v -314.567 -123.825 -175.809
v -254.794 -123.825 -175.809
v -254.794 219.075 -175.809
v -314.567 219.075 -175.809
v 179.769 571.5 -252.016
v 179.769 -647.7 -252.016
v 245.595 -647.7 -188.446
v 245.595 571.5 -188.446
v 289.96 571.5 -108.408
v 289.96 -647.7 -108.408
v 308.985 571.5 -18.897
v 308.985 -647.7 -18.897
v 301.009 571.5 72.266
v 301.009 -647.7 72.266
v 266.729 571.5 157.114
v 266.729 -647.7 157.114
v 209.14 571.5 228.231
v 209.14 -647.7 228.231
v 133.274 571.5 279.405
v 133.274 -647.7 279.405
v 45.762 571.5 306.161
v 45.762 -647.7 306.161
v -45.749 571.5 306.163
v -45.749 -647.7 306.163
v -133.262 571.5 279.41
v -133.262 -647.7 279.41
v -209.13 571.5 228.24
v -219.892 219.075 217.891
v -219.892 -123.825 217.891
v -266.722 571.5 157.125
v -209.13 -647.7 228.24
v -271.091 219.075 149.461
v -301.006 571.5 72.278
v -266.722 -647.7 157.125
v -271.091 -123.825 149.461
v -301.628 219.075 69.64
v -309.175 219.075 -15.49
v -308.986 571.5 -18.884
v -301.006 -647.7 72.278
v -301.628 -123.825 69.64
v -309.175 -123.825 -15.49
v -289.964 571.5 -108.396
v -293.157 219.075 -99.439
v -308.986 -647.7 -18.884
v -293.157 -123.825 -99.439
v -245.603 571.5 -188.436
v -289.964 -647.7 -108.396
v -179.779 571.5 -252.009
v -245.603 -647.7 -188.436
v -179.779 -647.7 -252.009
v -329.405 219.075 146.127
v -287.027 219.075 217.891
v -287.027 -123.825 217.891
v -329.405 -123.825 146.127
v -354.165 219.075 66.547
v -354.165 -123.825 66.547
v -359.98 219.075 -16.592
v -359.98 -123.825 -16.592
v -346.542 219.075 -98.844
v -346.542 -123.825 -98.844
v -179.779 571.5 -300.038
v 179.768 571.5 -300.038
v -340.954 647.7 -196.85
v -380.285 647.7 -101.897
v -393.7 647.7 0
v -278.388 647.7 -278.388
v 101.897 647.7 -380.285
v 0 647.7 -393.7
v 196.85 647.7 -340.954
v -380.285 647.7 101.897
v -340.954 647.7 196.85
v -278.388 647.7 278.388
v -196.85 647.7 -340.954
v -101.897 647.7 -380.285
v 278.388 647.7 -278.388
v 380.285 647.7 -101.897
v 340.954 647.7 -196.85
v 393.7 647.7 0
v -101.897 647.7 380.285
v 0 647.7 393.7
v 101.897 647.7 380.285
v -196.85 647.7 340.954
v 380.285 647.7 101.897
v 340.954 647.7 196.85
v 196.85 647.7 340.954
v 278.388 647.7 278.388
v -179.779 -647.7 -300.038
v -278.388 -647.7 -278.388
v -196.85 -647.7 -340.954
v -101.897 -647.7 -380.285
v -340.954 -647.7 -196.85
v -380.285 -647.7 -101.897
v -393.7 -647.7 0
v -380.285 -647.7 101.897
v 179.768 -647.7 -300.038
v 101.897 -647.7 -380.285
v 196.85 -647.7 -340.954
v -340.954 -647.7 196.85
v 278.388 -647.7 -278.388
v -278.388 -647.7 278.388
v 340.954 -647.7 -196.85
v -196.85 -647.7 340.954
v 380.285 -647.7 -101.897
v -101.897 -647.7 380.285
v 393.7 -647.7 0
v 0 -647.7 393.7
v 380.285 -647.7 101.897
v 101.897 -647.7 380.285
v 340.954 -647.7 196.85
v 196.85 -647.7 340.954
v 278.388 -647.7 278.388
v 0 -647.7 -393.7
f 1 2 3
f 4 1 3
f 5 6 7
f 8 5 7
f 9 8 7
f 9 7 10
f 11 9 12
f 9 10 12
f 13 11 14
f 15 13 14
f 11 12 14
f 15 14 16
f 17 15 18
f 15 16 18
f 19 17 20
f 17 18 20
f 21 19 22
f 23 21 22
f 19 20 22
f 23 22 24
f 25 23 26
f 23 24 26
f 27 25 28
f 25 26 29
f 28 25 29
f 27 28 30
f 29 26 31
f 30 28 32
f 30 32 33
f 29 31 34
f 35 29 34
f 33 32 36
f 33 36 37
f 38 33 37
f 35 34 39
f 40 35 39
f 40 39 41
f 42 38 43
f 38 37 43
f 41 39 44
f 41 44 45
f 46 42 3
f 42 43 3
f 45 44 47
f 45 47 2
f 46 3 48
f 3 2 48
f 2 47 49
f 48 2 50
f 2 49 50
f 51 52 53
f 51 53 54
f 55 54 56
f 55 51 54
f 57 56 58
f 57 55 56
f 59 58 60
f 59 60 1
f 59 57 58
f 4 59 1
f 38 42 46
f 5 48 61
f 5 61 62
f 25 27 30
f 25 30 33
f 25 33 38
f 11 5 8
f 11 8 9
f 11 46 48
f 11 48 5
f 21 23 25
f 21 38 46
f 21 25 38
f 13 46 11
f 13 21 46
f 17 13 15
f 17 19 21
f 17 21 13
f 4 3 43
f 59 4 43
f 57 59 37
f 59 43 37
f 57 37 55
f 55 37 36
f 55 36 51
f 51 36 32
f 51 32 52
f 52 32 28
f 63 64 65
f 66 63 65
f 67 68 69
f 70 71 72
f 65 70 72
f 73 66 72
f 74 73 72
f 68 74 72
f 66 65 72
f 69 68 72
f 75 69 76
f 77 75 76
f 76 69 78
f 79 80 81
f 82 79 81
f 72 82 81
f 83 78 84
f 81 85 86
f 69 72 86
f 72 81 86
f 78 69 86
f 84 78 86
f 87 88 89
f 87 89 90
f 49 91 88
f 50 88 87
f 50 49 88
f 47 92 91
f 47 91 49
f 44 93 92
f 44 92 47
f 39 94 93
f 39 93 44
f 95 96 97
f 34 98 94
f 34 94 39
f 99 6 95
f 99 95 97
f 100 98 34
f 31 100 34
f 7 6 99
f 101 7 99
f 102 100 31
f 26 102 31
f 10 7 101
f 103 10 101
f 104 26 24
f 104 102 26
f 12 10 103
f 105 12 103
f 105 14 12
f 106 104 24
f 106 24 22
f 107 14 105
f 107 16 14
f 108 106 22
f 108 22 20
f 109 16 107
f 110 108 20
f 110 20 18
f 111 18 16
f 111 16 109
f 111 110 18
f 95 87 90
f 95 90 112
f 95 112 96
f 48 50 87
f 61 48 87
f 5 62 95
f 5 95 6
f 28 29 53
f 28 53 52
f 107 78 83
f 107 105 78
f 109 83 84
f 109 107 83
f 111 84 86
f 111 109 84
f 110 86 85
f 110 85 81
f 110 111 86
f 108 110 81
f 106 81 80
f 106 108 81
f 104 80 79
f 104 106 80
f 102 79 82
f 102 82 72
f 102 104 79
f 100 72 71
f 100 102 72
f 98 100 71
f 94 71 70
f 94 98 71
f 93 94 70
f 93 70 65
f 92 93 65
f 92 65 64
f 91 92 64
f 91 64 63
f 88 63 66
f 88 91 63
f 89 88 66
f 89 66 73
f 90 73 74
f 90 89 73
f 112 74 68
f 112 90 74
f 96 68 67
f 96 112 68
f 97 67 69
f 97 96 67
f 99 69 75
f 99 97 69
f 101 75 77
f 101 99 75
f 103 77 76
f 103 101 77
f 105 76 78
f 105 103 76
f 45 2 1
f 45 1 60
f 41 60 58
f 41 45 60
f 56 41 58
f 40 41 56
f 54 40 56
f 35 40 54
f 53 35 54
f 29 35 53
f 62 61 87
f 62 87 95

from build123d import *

# Parameters (mm, degrees)
F0_R     = 360.3625
F1_DEPTH = 647.7
F3_DEPTH = 1219.2
F5_W     = 342.9
F5_H     = 393.7
F6_DEPTH = 279.4
F7_R     = 393.7
F7_R_2   = 360.3625
F8_DEPTH = 647.7


# Not quite as in the source:
# - a feature names something its author has since deleted; it is built from what else it names


with BuildPart() as f1:
    # F0 (on Front) → F1 (new body, symmetric)
    with BuildSketch(Plane.XZ):
        Circle(F0_R)
    extrude(amount=F1_DEPTH, both=True)

    # F2 (on face) → F3 (cut)
    with BuildSketch(Plane.XZ.offset(647.7)):
        with BuildLine():
            ThreePointArc((-76.2, -300.0375), (-130.2228778271, -280.8397113954), (-179.7789835799, -252.0088460138))
            Line((-179.7789835799, -252.0088460138), (-179.7789835799, -300.0375))
            Line((-179.7789835799, -300.0375), (-76.2, -300.0375))
        make_face()
        with BuildLine():
            ThreePointArc((179.7685, -252.016324499), (275.2076740277, -141.7380596823), (309.5625, 0))
            ThreePointArc((309.5625, 0), (-141.7323354104, 275.2106220794), (-179.7789835799, -252.0088460138))
            ThreePointArc((-179.7789835799, -252.0088460138), (-130.2228778271, -280.8397113954), (-76.2, -300.0375))
            Line((-76.2, -300.0375), (76.2, -300.0375))
            ThreePointArc((76.2, -300.0375), (130.217036413, -280.8424199334), (179.7685, -252.016324499))
        make_face()
        with BuildLine():
            Line((179.7685, -300.0375), (179.7685, -252.016324499))
            ThreePointArc((179.7685, -252.016324499), (130.217036413, -280.8424199334), (76.2, -300.0375))
            Line((76.2, -300.0375), (179.7685, -300.0375))
        make_face()
    extrude(amount=-F3_DEPTH, mode=Mode.SUBTRACT)

    # F5 (on offset) → F6 (cut)
    with BuildSketch(Plane.YZ.offset(-203.2)):
        with Locations((47.625, 21.0411539862)):
            Rectangle(F5_W, F5_H)
    extrude(amount=-F6_DEPTH, mode=Mode.SUBTRACT)

    # F7 (on Front) → F8 (join, symmetric)
    with BuildSketch(Plane.XZ):
        Circle(F7_R)
        Circle(F7_R_2, mode=Mode.SUBTRACT)
    extrude(amount=F8_DEPTH, both=True)


solid = f1.part
